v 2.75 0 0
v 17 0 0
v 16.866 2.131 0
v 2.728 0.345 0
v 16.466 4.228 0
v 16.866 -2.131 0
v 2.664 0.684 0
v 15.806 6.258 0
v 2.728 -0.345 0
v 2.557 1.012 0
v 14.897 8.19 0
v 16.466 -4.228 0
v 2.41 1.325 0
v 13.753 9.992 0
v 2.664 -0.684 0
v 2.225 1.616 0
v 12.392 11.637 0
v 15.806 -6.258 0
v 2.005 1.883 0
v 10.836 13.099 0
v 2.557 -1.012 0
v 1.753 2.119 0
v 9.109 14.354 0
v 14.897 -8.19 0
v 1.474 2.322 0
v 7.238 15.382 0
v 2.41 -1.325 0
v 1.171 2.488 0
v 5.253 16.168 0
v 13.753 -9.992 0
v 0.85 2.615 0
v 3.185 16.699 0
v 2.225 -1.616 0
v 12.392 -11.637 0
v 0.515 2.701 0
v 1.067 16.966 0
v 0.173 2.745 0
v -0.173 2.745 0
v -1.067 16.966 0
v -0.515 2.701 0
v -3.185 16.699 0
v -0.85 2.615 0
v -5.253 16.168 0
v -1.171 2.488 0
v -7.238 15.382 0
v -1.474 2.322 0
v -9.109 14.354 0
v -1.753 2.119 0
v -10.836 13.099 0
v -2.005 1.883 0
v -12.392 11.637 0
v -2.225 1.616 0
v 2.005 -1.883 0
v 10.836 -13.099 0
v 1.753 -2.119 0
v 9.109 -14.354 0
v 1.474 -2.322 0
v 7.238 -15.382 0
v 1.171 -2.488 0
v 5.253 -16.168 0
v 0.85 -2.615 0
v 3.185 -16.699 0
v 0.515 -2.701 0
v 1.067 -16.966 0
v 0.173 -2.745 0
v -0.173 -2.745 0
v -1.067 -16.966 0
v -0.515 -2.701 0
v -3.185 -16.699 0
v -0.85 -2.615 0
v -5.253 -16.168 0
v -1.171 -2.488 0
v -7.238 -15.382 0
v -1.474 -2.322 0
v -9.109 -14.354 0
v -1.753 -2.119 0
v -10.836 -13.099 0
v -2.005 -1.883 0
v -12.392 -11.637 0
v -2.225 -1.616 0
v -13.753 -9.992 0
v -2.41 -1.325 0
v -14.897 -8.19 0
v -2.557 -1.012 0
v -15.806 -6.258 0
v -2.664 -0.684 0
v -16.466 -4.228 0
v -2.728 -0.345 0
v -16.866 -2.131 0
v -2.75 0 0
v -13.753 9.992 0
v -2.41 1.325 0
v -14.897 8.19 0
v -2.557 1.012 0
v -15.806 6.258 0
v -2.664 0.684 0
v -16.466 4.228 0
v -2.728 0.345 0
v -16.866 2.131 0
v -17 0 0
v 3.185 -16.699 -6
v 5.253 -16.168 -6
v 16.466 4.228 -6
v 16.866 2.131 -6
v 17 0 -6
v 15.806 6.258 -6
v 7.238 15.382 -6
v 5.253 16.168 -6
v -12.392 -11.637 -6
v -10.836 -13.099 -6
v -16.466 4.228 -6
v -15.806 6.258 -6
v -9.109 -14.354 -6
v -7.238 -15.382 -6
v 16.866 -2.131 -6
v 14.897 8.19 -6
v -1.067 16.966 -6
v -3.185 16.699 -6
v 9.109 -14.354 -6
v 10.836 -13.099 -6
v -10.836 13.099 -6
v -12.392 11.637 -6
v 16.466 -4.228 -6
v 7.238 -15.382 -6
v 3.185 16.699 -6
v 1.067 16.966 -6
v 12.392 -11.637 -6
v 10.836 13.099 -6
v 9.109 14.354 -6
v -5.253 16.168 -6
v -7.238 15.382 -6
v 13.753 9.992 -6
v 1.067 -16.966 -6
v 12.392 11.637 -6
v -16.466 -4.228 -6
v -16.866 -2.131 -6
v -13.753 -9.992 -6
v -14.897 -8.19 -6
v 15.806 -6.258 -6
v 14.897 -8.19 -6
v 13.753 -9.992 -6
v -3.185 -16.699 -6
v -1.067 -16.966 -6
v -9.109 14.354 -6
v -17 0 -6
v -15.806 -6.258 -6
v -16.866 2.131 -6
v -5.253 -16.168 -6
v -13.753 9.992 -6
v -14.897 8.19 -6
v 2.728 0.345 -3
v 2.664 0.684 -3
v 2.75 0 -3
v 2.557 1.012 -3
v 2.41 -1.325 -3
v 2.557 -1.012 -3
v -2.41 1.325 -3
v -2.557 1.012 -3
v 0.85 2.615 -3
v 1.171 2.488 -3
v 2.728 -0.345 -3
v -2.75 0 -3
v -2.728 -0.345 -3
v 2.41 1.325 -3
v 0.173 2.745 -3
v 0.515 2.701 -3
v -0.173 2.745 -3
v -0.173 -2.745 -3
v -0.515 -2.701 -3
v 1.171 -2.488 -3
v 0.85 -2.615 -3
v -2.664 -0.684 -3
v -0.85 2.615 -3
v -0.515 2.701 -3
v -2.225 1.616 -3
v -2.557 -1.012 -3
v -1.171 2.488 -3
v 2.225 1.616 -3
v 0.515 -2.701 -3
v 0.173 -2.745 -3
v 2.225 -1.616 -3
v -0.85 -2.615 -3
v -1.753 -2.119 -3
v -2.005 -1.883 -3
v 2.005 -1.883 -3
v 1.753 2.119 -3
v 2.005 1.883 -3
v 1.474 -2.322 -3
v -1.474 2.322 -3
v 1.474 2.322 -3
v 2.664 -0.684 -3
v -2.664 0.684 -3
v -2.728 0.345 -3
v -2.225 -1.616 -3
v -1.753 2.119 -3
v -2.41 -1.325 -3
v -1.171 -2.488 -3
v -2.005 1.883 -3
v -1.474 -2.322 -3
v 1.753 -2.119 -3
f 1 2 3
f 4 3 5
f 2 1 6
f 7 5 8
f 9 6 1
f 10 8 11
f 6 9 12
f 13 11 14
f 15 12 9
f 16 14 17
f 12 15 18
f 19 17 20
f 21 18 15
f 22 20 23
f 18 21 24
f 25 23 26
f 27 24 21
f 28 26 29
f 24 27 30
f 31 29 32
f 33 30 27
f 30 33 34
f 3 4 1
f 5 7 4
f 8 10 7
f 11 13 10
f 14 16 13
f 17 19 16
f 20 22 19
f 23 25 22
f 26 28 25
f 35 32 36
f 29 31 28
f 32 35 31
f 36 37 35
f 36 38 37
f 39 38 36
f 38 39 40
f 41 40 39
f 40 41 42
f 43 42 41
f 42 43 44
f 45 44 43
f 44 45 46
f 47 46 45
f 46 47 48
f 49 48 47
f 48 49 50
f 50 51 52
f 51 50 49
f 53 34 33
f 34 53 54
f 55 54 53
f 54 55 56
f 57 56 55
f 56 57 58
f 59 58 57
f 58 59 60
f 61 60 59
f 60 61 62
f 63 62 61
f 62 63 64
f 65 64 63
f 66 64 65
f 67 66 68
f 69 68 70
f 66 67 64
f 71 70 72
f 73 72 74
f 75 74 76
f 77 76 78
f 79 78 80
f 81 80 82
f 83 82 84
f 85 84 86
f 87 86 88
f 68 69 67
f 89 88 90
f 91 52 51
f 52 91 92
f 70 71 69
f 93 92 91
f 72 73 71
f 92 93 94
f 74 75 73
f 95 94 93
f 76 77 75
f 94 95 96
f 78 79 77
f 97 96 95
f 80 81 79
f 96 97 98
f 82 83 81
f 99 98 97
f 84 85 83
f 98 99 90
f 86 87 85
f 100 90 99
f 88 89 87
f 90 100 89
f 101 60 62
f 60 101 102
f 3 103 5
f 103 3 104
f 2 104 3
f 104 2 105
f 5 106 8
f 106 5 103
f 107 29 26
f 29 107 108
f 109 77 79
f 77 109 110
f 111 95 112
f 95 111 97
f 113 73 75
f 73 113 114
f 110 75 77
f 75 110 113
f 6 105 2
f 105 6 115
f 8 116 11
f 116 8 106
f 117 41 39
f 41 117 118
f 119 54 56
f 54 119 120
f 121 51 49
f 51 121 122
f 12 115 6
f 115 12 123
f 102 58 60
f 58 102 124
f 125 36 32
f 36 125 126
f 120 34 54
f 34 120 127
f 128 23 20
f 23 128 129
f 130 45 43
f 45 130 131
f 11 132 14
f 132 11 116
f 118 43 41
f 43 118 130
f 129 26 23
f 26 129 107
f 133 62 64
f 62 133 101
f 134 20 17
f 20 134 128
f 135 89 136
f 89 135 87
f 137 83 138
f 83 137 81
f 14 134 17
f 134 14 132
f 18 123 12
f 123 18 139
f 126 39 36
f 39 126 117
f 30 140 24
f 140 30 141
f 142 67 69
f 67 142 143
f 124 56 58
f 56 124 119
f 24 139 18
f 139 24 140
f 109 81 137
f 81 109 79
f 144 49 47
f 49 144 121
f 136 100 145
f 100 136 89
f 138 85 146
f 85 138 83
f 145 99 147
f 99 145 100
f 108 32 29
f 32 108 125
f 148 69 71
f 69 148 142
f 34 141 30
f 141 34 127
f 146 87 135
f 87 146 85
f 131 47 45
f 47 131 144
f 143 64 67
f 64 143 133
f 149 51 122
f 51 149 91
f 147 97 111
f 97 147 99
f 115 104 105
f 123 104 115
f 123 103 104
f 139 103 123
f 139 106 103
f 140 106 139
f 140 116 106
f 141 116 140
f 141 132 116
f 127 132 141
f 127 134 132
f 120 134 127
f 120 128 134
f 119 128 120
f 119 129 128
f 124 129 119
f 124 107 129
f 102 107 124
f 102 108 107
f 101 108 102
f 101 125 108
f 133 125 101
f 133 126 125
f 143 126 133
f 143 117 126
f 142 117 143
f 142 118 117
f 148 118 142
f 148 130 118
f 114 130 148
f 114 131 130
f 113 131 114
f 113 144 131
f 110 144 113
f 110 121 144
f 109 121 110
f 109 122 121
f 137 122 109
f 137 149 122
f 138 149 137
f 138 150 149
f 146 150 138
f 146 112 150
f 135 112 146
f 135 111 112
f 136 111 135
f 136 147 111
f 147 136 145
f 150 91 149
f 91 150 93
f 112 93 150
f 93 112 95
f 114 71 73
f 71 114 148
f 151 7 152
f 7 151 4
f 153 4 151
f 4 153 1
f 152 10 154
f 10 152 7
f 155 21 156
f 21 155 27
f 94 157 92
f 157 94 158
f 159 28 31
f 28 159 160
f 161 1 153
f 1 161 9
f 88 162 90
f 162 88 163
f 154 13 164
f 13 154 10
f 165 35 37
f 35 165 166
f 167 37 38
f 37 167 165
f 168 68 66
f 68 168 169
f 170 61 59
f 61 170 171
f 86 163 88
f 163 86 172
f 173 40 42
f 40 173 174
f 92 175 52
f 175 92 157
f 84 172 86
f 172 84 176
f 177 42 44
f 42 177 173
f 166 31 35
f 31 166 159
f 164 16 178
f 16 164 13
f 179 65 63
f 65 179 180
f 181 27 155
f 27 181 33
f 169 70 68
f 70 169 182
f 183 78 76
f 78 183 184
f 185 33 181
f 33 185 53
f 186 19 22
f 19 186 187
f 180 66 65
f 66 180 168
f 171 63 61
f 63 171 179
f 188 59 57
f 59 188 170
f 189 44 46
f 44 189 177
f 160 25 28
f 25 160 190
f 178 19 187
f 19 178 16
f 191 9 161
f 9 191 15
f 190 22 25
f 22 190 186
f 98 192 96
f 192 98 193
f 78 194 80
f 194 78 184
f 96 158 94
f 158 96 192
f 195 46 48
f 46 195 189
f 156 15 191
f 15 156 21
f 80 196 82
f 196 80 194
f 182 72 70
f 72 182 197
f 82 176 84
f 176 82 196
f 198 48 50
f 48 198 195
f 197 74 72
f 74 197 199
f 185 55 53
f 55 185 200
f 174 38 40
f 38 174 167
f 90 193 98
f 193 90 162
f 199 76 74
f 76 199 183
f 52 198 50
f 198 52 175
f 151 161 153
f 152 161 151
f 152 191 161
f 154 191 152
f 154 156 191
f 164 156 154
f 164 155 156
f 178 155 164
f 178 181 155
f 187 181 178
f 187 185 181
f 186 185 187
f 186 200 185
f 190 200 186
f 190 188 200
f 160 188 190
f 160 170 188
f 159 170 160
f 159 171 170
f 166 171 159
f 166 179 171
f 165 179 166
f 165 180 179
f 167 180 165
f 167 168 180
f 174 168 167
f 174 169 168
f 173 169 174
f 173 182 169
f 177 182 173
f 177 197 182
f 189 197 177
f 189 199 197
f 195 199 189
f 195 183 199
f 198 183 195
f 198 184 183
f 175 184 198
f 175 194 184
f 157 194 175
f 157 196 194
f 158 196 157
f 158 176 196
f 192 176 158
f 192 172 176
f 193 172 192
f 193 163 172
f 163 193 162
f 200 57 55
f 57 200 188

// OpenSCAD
$fn = 50;


difference() {
	union() {
		translate(v = [0, 0, -3.0000000000]) {
			cylinder(h = 3, r = 7.0000000000);
		}
		translate(v = [0, 0, -6.0000000000]) {
			cylinder(h = 6, r = 17.0000000000);
		}
	}
	union() {
		#translate(v = [0, 0, -3]) {
			cylinder(h = 3, r = 2.7500000000);
		}
	}
}
